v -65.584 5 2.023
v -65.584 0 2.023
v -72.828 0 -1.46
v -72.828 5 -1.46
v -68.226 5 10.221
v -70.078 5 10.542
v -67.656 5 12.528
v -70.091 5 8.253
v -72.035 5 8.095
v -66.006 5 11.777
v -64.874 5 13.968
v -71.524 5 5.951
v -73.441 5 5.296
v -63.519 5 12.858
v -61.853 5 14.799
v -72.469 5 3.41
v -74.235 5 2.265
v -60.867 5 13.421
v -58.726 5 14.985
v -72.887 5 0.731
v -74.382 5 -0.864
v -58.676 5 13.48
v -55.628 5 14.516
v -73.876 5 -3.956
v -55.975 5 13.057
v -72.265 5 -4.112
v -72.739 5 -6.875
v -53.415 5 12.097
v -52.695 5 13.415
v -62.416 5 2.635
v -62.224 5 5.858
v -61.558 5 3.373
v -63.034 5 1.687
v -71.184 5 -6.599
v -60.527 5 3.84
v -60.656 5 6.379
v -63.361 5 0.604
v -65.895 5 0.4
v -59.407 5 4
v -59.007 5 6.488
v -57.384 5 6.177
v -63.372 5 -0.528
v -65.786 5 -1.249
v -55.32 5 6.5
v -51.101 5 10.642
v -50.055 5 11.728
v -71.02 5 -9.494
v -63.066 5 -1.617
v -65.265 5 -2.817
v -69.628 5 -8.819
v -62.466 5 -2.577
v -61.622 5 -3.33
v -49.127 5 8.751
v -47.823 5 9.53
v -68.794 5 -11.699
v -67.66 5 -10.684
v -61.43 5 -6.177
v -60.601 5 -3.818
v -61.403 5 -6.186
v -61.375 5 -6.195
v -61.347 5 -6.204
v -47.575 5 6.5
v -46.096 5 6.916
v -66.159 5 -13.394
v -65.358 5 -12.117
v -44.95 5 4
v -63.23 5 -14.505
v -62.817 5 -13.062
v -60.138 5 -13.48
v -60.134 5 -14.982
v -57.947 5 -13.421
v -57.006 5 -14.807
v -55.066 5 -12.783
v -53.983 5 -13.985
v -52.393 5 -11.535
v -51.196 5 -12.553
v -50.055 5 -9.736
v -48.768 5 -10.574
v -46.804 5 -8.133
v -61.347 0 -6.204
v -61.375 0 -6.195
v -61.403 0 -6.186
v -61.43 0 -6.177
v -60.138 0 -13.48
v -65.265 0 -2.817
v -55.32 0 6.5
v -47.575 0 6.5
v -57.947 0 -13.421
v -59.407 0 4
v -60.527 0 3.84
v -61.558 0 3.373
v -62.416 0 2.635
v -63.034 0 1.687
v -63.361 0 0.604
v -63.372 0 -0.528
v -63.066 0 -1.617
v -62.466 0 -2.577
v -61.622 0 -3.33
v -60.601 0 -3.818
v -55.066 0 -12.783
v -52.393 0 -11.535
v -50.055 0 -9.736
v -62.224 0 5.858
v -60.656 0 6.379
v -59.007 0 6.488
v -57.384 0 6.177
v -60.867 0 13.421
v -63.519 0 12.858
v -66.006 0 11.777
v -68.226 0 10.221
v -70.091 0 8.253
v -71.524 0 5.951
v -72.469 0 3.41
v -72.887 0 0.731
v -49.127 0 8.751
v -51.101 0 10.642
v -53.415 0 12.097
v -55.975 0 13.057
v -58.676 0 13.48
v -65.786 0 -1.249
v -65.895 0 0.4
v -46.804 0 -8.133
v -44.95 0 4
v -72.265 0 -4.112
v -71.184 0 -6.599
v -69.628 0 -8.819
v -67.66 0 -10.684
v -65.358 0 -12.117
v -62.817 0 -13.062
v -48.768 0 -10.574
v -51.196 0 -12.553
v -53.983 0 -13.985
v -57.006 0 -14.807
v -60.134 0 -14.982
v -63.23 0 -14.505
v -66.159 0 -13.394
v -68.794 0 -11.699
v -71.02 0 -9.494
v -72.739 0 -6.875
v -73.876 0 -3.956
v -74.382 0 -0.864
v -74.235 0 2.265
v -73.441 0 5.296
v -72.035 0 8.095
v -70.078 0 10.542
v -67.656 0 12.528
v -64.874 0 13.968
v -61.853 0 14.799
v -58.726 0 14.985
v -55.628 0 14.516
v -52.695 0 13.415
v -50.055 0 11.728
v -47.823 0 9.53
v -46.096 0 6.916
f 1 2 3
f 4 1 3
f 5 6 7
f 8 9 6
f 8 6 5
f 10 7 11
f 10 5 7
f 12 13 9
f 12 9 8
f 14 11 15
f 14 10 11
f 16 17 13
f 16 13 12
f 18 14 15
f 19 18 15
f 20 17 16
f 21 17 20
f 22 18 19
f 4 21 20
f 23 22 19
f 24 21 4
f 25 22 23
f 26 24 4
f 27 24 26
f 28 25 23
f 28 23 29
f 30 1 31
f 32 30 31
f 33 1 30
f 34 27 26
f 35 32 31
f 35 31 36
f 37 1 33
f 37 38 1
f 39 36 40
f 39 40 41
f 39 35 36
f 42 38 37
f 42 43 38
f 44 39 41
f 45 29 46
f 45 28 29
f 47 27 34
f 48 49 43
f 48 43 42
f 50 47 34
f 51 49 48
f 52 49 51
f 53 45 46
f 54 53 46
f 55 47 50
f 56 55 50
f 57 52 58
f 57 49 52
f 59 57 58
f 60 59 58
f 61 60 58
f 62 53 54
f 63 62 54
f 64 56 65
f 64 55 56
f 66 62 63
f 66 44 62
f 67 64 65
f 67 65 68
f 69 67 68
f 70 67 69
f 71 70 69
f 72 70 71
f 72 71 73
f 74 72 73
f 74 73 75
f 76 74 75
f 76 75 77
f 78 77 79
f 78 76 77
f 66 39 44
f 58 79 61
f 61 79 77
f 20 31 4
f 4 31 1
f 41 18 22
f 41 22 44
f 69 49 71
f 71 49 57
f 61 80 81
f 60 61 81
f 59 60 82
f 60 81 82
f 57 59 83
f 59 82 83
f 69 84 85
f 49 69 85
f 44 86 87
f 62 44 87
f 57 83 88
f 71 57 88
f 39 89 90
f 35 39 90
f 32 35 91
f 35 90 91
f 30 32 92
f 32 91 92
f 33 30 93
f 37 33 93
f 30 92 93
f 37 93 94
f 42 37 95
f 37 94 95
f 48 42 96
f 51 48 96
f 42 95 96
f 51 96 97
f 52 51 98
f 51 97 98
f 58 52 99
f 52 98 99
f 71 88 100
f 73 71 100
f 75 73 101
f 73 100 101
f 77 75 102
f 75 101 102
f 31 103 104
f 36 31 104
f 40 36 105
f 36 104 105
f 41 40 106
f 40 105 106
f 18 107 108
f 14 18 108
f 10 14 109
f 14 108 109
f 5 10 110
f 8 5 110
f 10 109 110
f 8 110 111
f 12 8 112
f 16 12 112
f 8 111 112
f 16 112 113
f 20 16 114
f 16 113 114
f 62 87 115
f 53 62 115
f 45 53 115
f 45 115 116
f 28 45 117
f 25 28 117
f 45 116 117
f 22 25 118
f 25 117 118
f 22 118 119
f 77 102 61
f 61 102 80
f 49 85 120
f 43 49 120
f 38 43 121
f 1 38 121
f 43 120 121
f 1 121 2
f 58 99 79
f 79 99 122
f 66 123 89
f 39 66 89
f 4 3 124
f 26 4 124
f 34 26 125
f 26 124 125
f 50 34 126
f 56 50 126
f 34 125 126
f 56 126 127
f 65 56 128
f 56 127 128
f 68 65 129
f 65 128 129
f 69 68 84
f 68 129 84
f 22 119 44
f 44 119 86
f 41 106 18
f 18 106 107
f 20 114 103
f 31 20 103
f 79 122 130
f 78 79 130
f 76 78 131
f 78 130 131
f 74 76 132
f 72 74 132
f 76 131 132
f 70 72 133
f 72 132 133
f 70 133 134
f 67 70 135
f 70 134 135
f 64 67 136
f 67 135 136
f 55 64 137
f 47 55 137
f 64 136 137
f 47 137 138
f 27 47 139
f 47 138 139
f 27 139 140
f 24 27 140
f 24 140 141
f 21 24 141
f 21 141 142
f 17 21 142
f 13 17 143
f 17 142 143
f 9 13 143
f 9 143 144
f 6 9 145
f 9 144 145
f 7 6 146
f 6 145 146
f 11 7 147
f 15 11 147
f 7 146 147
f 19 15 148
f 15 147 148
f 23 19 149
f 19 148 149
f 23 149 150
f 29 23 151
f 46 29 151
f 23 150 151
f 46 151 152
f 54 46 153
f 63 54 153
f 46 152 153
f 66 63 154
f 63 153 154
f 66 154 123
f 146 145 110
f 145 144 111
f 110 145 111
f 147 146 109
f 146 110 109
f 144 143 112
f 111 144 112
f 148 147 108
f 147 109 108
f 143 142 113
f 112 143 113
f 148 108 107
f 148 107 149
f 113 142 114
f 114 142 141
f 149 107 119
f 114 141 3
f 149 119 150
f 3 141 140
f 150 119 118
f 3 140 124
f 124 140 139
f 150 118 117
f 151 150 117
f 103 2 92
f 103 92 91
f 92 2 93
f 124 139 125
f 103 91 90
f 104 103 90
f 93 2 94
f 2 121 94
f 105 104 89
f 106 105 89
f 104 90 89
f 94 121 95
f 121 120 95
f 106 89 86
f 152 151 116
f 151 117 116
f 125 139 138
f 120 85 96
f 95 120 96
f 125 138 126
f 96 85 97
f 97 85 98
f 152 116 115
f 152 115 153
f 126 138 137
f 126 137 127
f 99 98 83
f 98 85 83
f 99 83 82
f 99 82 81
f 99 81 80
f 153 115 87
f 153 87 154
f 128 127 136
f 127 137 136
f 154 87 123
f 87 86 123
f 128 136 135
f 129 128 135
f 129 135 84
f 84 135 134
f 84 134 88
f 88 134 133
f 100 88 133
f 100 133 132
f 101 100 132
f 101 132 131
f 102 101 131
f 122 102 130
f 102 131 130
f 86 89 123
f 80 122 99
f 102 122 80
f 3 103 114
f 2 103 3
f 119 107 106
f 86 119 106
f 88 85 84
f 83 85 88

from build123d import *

# Parameters (mm, degrees)
EXTRUDE_1_DEPTH = 5


with BuildPart() as part:
    # 草图1 → 凸台-拉伸1 (new body)
    with BuildSketch(Plane(origin=(0, 0, 0), x_dir=(1, 0, 0), z_dir=(0, 1, 0))):
        with BuildLine():
            ThreePointArc((-46.803501746, 8.133377636), (-74.235016913, -2.264931442), (-44.950167705, -4))
            Line((-44.950167705, -4), (-59.407, -4))
            ThreePointArc((-59.407, -4), (-63.361137843, -0.603981718), (-60.601113484, 3.817603042))
            Line((-60.601113484, 3.817603042), (-46.803501746, 8.133377636))
        make_face()
        with BuildLine():
            Line((-60.13775005, 13.480207875), (-65.265019195, 2.816666667))
            ThreePointArc((-65.265019195, 2.816666667), (-65.892913632, 0.427696579), (-65.584160854, -2.023038254))
            Line((-65.584160854, -2.023038254), (-72.827832577, 1.459881143))
            ThreePointArc((-72.827832577, 1.459881143), (-68.690796982, 9.801077165), (-60.13775005, 13.480207875))
        make_face(mode=Mode.SUBTRACT)
        with BuildLine():
            Line((-72.887207875, -0.73075005), (-62.223666667, -5.858019195))
            ThreePointArc((-62.223666667, -5.858019195), (-59.834696579, -6.485913632), (-57.383961746, -6.177160854))
            Line((-57.383961746, -6.177160854), (-60.866881143, -13.420832577))
            ThreePointArc((-60.866881143, -13.420832577), (-69.208077165, -9.283796982), (-72.887207875, -0.73075005))
        make_face(mode=Mode.SUBTRACT)
        with BuildLine():
            Line((-58.67624995, -13.480207875), (-55.320009864, -6.5))
            Line((-55.320009864, -6.5), (-47.574840434, -6.5))
            ThreePointArc((-47.574840434, -6.5), (-52.22107626, -11.428582589), (-58.67624995, -13.480207875))
        make_face(mode=Mode.SUBTRACT)
        with BuildLine():
            ThreePointArc((-57.947118857, 13.420832577), (-53.695607864, 12.232334195), (-50.054812322, 9.735840264))
            Line((-50.054812322, 9.735840264), (-61.347434411, 6.203604944))
            ThreePointArc((-61.347434411, 6.203604944), (-61.388780441, 6.19052068), (-61.430038254, 6.177160854))
            Line((-61.430038254, 6.177160854), (-57.947118857, 13.420832577))
        make_face(mode=Mode.SUBTRACT)
    extrude(amount=EXTRUDE_1_DEPTH)


solid = part.part
